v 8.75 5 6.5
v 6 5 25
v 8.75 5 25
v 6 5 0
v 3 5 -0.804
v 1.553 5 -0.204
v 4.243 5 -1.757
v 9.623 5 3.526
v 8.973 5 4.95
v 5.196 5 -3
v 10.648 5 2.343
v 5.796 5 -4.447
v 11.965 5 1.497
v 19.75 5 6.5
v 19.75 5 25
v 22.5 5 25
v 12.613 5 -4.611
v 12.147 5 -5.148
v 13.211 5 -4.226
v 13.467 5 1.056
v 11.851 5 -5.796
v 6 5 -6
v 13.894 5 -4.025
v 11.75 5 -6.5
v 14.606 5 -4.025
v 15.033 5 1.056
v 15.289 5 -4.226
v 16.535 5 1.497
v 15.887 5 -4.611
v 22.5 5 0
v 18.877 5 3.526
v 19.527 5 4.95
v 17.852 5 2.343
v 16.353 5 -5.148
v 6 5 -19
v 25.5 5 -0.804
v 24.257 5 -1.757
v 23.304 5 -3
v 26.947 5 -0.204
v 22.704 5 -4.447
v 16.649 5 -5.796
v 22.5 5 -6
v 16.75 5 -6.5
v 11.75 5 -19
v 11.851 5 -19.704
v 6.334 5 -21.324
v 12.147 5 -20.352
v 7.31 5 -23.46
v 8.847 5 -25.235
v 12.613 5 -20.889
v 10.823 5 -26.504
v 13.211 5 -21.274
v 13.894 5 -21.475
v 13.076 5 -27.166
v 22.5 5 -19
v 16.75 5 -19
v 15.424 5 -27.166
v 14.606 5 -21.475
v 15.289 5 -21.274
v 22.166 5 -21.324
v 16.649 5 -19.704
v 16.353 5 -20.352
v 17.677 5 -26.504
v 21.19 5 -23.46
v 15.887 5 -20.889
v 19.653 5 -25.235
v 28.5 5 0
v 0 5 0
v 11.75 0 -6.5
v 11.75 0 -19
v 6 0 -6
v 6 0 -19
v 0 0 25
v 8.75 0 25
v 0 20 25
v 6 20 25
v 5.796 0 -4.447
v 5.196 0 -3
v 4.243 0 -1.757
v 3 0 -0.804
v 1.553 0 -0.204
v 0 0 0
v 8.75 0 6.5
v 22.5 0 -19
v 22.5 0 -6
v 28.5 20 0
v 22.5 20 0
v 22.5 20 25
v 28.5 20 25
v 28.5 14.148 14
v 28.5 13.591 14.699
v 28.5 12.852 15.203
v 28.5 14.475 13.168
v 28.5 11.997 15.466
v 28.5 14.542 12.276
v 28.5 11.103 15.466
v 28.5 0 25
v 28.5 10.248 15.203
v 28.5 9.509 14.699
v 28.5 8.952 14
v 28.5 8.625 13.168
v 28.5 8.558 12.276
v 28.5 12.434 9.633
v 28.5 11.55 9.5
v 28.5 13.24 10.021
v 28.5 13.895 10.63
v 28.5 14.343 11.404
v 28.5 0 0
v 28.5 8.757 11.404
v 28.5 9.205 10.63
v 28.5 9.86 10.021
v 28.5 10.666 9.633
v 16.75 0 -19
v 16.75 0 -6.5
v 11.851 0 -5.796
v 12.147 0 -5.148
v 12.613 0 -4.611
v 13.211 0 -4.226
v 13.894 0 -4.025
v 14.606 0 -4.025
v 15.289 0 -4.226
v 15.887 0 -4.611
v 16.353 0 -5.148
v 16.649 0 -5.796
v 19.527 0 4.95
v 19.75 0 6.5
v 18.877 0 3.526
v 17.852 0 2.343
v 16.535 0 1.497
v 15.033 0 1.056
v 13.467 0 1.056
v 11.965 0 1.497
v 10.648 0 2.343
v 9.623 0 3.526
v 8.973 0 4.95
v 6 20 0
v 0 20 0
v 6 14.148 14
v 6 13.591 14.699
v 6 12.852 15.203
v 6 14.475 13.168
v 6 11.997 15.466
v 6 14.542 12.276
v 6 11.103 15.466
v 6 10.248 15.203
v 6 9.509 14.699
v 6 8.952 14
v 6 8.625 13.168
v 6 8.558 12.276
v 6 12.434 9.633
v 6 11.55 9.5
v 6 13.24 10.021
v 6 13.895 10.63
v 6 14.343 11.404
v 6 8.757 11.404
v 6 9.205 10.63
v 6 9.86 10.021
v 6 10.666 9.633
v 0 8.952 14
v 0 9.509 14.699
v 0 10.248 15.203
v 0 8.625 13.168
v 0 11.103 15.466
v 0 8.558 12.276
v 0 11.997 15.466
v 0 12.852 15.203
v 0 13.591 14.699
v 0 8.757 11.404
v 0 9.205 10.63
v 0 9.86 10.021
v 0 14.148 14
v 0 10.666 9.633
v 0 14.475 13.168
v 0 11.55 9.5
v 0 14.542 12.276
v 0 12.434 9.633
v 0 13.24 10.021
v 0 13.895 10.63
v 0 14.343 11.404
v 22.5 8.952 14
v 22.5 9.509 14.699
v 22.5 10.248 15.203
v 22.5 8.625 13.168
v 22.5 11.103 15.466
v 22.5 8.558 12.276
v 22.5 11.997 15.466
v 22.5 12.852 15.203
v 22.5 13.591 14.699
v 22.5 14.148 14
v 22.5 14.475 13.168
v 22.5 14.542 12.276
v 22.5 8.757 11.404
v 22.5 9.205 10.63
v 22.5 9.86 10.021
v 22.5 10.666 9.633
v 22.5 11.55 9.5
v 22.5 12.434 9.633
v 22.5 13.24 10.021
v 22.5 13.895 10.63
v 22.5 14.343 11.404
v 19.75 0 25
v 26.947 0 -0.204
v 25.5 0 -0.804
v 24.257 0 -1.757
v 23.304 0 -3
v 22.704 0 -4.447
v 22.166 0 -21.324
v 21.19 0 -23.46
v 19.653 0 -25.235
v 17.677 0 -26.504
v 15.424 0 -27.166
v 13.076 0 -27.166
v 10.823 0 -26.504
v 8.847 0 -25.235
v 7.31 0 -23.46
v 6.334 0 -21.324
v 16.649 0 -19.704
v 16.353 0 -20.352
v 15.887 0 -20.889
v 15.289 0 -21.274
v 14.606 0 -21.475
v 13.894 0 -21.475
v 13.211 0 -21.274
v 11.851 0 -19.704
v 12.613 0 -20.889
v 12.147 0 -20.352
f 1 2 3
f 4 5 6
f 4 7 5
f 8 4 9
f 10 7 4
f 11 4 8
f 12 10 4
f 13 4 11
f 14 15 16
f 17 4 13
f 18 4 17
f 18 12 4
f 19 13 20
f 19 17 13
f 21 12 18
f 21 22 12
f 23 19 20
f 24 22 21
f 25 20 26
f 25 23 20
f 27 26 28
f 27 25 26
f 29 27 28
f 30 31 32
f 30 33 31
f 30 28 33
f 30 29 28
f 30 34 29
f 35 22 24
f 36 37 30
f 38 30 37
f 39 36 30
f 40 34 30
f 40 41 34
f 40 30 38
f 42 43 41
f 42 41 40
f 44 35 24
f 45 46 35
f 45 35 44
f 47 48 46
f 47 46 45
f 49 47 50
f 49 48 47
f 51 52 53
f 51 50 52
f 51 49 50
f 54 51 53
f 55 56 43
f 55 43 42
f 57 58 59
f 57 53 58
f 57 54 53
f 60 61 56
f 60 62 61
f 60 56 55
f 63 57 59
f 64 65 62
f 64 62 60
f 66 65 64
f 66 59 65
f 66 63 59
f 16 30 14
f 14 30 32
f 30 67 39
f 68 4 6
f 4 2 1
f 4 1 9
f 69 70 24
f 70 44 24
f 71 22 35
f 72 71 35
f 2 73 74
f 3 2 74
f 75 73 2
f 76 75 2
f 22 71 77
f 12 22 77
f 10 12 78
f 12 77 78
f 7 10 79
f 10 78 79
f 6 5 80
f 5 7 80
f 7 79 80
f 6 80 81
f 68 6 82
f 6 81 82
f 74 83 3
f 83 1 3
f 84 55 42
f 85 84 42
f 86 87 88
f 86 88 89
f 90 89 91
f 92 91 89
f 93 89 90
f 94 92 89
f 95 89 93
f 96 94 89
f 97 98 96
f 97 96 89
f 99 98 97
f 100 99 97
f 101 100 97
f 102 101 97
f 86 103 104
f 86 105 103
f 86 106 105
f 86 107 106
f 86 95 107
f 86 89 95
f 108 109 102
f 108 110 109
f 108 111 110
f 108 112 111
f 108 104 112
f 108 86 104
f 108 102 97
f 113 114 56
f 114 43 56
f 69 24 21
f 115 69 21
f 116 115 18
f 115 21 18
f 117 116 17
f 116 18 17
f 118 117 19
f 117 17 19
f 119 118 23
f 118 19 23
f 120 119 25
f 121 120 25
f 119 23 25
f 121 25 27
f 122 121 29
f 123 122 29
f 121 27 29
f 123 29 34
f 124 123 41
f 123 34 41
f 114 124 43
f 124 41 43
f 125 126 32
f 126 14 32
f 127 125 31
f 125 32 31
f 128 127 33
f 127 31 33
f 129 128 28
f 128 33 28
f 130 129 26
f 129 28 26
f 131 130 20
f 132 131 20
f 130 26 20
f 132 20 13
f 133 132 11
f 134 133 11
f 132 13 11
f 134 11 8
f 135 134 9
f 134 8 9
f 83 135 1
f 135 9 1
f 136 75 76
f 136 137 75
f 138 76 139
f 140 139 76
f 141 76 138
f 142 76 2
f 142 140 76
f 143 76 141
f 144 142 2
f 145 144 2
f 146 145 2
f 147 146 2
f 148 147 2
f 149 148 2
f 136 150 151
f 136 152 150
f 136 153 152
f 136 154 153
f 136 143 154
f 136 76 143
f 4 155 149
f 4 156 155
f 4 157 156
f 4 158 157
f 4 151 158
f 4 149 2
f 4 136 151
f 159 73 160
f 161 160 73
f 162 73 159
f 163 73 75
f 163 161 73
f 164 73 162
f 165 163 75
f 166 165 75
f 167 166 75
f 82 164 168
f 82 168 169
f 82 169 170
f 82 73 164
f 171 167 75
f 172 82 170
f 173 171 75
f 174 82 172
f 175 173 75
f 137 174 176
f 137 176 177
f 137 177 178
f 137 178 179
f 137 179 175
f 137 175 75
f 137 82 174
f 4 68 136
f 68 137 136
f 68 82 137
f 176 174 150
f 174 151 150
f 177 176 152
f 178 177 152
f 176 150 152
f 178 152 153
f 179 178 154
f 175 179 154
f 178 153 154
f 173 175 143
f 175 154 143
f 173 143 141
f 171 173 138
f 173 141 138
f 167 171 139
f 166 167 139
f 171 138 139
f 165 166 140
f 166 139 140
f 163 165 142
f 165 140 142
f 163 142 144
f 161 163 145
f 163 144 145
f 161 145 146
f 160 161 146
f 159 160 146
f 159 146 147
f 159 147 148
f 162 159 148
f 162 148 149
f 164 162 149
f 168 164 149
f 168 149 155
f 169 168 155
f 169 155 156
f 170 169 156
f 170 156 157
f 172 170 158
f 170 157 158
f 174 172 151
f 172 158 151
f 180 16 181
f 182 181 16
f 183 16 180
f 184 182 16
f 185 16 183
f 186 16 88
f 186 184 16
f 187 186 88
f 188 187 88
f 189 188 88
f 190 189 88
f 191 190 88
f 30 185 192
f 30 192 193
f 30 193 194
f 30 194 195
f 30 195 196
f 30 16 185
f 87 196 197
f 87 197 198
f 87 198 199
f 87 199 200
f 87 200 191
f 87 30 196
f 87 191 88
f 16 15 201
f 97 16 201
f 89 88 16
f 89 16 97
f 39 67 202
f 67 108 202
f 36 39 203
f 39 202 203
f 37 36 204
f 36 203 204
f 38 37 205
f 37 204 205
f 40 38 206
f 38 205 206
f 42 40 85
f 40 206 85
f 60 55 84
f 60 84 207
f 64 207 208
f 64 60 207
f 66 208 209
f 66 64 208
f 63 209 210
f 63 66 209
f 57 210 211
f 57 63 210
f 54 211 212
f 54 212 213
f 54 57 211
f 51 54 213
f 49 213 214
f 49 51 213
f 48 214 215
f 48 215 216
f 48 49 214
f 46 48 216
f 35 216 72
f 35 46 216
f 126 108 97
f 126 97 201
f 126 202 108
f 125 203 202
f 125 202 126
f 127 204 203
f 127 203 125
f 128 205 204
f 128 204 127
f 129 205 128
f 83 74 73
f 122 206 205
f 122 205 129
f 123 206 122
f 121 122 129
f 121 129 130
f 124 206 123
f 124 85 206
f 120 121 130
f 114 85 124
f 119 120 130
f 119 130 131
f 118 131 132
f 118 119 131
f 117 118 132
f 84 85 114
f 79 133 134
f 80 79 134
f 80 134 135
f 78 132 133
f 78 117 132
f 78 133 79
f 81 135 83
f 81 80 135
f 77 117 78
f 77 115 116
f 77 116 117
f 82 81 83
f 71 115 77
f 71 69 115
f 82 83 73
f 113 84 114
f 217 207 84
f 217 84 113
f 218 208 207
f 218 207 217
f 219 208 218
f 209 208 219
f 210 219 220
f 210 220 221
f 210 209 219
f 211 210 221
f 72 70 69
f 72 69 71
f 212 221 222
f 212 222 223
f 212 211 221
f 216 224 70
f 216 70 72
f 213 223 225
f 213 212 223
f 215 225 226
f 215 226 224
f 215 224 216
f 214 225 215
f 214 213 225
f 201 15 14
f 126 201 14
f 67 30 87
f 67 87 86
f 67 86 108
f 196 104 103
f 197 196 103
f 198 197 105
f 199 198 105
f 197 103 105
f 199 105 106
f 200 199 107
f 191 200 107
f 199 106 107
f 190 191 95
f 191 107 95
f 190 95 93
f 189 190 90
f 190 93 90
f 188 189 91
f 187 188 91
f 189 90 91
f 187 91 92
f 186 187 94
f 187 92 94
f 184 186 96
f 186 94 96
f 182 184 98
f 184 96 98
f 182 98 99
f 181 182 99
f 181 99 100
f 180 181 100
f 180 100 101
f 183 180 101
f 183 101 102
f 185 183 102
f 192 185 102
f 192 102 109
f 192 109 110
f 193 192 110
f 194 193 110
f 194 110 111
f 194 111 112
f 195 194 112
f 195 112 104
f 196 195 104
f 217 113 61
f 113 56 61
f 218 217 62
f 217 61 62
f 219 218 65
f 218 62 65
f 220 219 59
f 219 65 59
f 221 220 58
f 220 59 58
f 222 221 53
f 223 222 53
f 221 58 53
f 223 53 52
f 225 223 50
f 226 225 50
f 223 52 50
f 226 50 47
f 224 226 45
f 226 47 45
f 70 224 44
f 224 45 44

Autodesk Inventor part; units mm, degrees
ref_plane "YZ Plane" through (0, 0, 0) normal (1, 0, 0) x (0, 1, 0)
ref_plane "XZ Plane" through (0, 0, 0) normal (0, 1, 0) x (-1, 0, 0)
ref_plane "XY Plane" through (0, 0, 0) normal (0, 0, 1) x (1, 0, 0)
sketch "Skizze1" plane through (0, 0, 0) normal (0, 0, 1) x (1, 0, 0)
  line L0 (0, 0) -> (0, 20)
  line L1 (0, 20) -> (6, 20)
  line L2 (6, 20) -> (6, 5)
  line L3 (6, 5) -> (22.5, 5)
  line L4 (22.5, 5) -> (22.5, 20)
  line L5 (22.5, 20) -> (28.5, 20)
  line L6 (28.5, 20) -> (28.5, 0)
  line L7 (28.5, 0) -> (0, 0)
  line L8 (14.25, 5) -> (14.25, 0) construction
  line L9 (0, 11.55) -> (28.5, 11.55) construction
  dimension "d0" = 6
  dimension "d1" = 5
  dimension "d2" = 11.55
  dimension "d3" = 16.5
  dimension "d4" = 20
  dimension "d14" = 28.5
extrude "Extrusion1" add sketch "Skizze1" along normal blind 25
sketch "Skizze2" plane through (28.5, 0, 0) normal (1, 0, 0) x (0, 0, -1)
  line L0 (-12.5, 11.55) -> (-12.5, 20) construction
  line L1 (0, 20) -> (-25, 20) construction
  circle A0 centre (-12.5, 11.55) radius 3
  point P0 (0, 0)
  point P1 (-25, 0)
  dimension "d7" = 11.55
  dimension "d20" = 6
extrude "Extrusion2" cut sketch "Skizze2" against normal through all
sketch "Skizze3" plane through (6, 5, 0) normal (0, 1, 0) x (1, 0, 0)
  line L0 (16.5, -25) -> (0, -25) construction
  line L1 (8.25, -25) -> (8.25, 0) construction
  line L2 (16.5, 0) -> (0, 0) construction
  line L3 (8.25, -43.5) -> (8.25, -6.5) construction
  line L4 (13.75, -43.5) -> (13.75, -6.5)
  line L5 (2.75, -6.5) -> (2.75, -43.5)
  arc A0 (2.75, -43.5) -> (13.75, -43.5) centre (8.25, -43.5) ccw
  arc A1 (13.75, -6.5) -> (2.75, -6.5) centre (8.25, -6.5) ccw
  line L6 (28.2, -12.5) -> (-11.7, -12.5) construction
  point P0 (-6, 0)
  dimension "d11" = 11
  dimension "d25" = 6
extrude "Extrusion3" cut sketch "Skizze3" against normal through all
sketch "Skizze4" plane through (6, 5, 0) normal (0, 1, 0) x (1, 0, 0)
  line L0 (16.5, 0) -> (0, 0) projected
  line L1 (8.25, -11) -> (8.25, 19) construction
  line L2 (-6, 0) -> (22.5, 0) projected
  line L3 (0, -11) -> (0, 19)
  line L4 (16.5, 19) -> (16.5, -11)
  arc A0 (0, -11) -> (16.5, -11) centre (8.25, -11) ccw
  arc A1 (16.5, 19) -> (0, 19) centre (8.25, 19) ccw
  line L5 (5.75, 19) -> (5.75, -11)
  arc A2 (5.75, -11) -> (10.75, -11) centre (8.25, -11) ccw
  line L6 (10.75, -11) -> (10.75, 19)
  arc A3 (10.75, 19) -> (5.75, 19) centre (8.25, 19) ccw
  arc A4 (5.75, 6.5) -> (10.75, 6.5) centre (8.25, 6.5) ccw
  point P0 (8.25, 4)
  point P1 (16.5, 0)
  point P2 (5.75, 0)
  point P3 (10.75, 0)
  point P4 (8.25, 0)
  point P5 (8.25, 0)
  dimension "d15" = 15
  dimension "d18" = 5
  dimension "d26" = 4
extrude "Extrusion4" add sketch "Skizze4" against normal up to surface (5 mm away) contours L0 L6 A3 L5 L3 A1 L4 | L0 L5 A4 L6
fillet "Rundung1" radius 6 2 edges at (6, 2.5, 0) (22.5, 2.5, 0)
ref_plane "Arbeitsebene1" through (14.25, 0, 25) normal (1, 0, 0) x (0, 0, -1)
properties part number "BeltDiscBottomPar_ohneLagert"
